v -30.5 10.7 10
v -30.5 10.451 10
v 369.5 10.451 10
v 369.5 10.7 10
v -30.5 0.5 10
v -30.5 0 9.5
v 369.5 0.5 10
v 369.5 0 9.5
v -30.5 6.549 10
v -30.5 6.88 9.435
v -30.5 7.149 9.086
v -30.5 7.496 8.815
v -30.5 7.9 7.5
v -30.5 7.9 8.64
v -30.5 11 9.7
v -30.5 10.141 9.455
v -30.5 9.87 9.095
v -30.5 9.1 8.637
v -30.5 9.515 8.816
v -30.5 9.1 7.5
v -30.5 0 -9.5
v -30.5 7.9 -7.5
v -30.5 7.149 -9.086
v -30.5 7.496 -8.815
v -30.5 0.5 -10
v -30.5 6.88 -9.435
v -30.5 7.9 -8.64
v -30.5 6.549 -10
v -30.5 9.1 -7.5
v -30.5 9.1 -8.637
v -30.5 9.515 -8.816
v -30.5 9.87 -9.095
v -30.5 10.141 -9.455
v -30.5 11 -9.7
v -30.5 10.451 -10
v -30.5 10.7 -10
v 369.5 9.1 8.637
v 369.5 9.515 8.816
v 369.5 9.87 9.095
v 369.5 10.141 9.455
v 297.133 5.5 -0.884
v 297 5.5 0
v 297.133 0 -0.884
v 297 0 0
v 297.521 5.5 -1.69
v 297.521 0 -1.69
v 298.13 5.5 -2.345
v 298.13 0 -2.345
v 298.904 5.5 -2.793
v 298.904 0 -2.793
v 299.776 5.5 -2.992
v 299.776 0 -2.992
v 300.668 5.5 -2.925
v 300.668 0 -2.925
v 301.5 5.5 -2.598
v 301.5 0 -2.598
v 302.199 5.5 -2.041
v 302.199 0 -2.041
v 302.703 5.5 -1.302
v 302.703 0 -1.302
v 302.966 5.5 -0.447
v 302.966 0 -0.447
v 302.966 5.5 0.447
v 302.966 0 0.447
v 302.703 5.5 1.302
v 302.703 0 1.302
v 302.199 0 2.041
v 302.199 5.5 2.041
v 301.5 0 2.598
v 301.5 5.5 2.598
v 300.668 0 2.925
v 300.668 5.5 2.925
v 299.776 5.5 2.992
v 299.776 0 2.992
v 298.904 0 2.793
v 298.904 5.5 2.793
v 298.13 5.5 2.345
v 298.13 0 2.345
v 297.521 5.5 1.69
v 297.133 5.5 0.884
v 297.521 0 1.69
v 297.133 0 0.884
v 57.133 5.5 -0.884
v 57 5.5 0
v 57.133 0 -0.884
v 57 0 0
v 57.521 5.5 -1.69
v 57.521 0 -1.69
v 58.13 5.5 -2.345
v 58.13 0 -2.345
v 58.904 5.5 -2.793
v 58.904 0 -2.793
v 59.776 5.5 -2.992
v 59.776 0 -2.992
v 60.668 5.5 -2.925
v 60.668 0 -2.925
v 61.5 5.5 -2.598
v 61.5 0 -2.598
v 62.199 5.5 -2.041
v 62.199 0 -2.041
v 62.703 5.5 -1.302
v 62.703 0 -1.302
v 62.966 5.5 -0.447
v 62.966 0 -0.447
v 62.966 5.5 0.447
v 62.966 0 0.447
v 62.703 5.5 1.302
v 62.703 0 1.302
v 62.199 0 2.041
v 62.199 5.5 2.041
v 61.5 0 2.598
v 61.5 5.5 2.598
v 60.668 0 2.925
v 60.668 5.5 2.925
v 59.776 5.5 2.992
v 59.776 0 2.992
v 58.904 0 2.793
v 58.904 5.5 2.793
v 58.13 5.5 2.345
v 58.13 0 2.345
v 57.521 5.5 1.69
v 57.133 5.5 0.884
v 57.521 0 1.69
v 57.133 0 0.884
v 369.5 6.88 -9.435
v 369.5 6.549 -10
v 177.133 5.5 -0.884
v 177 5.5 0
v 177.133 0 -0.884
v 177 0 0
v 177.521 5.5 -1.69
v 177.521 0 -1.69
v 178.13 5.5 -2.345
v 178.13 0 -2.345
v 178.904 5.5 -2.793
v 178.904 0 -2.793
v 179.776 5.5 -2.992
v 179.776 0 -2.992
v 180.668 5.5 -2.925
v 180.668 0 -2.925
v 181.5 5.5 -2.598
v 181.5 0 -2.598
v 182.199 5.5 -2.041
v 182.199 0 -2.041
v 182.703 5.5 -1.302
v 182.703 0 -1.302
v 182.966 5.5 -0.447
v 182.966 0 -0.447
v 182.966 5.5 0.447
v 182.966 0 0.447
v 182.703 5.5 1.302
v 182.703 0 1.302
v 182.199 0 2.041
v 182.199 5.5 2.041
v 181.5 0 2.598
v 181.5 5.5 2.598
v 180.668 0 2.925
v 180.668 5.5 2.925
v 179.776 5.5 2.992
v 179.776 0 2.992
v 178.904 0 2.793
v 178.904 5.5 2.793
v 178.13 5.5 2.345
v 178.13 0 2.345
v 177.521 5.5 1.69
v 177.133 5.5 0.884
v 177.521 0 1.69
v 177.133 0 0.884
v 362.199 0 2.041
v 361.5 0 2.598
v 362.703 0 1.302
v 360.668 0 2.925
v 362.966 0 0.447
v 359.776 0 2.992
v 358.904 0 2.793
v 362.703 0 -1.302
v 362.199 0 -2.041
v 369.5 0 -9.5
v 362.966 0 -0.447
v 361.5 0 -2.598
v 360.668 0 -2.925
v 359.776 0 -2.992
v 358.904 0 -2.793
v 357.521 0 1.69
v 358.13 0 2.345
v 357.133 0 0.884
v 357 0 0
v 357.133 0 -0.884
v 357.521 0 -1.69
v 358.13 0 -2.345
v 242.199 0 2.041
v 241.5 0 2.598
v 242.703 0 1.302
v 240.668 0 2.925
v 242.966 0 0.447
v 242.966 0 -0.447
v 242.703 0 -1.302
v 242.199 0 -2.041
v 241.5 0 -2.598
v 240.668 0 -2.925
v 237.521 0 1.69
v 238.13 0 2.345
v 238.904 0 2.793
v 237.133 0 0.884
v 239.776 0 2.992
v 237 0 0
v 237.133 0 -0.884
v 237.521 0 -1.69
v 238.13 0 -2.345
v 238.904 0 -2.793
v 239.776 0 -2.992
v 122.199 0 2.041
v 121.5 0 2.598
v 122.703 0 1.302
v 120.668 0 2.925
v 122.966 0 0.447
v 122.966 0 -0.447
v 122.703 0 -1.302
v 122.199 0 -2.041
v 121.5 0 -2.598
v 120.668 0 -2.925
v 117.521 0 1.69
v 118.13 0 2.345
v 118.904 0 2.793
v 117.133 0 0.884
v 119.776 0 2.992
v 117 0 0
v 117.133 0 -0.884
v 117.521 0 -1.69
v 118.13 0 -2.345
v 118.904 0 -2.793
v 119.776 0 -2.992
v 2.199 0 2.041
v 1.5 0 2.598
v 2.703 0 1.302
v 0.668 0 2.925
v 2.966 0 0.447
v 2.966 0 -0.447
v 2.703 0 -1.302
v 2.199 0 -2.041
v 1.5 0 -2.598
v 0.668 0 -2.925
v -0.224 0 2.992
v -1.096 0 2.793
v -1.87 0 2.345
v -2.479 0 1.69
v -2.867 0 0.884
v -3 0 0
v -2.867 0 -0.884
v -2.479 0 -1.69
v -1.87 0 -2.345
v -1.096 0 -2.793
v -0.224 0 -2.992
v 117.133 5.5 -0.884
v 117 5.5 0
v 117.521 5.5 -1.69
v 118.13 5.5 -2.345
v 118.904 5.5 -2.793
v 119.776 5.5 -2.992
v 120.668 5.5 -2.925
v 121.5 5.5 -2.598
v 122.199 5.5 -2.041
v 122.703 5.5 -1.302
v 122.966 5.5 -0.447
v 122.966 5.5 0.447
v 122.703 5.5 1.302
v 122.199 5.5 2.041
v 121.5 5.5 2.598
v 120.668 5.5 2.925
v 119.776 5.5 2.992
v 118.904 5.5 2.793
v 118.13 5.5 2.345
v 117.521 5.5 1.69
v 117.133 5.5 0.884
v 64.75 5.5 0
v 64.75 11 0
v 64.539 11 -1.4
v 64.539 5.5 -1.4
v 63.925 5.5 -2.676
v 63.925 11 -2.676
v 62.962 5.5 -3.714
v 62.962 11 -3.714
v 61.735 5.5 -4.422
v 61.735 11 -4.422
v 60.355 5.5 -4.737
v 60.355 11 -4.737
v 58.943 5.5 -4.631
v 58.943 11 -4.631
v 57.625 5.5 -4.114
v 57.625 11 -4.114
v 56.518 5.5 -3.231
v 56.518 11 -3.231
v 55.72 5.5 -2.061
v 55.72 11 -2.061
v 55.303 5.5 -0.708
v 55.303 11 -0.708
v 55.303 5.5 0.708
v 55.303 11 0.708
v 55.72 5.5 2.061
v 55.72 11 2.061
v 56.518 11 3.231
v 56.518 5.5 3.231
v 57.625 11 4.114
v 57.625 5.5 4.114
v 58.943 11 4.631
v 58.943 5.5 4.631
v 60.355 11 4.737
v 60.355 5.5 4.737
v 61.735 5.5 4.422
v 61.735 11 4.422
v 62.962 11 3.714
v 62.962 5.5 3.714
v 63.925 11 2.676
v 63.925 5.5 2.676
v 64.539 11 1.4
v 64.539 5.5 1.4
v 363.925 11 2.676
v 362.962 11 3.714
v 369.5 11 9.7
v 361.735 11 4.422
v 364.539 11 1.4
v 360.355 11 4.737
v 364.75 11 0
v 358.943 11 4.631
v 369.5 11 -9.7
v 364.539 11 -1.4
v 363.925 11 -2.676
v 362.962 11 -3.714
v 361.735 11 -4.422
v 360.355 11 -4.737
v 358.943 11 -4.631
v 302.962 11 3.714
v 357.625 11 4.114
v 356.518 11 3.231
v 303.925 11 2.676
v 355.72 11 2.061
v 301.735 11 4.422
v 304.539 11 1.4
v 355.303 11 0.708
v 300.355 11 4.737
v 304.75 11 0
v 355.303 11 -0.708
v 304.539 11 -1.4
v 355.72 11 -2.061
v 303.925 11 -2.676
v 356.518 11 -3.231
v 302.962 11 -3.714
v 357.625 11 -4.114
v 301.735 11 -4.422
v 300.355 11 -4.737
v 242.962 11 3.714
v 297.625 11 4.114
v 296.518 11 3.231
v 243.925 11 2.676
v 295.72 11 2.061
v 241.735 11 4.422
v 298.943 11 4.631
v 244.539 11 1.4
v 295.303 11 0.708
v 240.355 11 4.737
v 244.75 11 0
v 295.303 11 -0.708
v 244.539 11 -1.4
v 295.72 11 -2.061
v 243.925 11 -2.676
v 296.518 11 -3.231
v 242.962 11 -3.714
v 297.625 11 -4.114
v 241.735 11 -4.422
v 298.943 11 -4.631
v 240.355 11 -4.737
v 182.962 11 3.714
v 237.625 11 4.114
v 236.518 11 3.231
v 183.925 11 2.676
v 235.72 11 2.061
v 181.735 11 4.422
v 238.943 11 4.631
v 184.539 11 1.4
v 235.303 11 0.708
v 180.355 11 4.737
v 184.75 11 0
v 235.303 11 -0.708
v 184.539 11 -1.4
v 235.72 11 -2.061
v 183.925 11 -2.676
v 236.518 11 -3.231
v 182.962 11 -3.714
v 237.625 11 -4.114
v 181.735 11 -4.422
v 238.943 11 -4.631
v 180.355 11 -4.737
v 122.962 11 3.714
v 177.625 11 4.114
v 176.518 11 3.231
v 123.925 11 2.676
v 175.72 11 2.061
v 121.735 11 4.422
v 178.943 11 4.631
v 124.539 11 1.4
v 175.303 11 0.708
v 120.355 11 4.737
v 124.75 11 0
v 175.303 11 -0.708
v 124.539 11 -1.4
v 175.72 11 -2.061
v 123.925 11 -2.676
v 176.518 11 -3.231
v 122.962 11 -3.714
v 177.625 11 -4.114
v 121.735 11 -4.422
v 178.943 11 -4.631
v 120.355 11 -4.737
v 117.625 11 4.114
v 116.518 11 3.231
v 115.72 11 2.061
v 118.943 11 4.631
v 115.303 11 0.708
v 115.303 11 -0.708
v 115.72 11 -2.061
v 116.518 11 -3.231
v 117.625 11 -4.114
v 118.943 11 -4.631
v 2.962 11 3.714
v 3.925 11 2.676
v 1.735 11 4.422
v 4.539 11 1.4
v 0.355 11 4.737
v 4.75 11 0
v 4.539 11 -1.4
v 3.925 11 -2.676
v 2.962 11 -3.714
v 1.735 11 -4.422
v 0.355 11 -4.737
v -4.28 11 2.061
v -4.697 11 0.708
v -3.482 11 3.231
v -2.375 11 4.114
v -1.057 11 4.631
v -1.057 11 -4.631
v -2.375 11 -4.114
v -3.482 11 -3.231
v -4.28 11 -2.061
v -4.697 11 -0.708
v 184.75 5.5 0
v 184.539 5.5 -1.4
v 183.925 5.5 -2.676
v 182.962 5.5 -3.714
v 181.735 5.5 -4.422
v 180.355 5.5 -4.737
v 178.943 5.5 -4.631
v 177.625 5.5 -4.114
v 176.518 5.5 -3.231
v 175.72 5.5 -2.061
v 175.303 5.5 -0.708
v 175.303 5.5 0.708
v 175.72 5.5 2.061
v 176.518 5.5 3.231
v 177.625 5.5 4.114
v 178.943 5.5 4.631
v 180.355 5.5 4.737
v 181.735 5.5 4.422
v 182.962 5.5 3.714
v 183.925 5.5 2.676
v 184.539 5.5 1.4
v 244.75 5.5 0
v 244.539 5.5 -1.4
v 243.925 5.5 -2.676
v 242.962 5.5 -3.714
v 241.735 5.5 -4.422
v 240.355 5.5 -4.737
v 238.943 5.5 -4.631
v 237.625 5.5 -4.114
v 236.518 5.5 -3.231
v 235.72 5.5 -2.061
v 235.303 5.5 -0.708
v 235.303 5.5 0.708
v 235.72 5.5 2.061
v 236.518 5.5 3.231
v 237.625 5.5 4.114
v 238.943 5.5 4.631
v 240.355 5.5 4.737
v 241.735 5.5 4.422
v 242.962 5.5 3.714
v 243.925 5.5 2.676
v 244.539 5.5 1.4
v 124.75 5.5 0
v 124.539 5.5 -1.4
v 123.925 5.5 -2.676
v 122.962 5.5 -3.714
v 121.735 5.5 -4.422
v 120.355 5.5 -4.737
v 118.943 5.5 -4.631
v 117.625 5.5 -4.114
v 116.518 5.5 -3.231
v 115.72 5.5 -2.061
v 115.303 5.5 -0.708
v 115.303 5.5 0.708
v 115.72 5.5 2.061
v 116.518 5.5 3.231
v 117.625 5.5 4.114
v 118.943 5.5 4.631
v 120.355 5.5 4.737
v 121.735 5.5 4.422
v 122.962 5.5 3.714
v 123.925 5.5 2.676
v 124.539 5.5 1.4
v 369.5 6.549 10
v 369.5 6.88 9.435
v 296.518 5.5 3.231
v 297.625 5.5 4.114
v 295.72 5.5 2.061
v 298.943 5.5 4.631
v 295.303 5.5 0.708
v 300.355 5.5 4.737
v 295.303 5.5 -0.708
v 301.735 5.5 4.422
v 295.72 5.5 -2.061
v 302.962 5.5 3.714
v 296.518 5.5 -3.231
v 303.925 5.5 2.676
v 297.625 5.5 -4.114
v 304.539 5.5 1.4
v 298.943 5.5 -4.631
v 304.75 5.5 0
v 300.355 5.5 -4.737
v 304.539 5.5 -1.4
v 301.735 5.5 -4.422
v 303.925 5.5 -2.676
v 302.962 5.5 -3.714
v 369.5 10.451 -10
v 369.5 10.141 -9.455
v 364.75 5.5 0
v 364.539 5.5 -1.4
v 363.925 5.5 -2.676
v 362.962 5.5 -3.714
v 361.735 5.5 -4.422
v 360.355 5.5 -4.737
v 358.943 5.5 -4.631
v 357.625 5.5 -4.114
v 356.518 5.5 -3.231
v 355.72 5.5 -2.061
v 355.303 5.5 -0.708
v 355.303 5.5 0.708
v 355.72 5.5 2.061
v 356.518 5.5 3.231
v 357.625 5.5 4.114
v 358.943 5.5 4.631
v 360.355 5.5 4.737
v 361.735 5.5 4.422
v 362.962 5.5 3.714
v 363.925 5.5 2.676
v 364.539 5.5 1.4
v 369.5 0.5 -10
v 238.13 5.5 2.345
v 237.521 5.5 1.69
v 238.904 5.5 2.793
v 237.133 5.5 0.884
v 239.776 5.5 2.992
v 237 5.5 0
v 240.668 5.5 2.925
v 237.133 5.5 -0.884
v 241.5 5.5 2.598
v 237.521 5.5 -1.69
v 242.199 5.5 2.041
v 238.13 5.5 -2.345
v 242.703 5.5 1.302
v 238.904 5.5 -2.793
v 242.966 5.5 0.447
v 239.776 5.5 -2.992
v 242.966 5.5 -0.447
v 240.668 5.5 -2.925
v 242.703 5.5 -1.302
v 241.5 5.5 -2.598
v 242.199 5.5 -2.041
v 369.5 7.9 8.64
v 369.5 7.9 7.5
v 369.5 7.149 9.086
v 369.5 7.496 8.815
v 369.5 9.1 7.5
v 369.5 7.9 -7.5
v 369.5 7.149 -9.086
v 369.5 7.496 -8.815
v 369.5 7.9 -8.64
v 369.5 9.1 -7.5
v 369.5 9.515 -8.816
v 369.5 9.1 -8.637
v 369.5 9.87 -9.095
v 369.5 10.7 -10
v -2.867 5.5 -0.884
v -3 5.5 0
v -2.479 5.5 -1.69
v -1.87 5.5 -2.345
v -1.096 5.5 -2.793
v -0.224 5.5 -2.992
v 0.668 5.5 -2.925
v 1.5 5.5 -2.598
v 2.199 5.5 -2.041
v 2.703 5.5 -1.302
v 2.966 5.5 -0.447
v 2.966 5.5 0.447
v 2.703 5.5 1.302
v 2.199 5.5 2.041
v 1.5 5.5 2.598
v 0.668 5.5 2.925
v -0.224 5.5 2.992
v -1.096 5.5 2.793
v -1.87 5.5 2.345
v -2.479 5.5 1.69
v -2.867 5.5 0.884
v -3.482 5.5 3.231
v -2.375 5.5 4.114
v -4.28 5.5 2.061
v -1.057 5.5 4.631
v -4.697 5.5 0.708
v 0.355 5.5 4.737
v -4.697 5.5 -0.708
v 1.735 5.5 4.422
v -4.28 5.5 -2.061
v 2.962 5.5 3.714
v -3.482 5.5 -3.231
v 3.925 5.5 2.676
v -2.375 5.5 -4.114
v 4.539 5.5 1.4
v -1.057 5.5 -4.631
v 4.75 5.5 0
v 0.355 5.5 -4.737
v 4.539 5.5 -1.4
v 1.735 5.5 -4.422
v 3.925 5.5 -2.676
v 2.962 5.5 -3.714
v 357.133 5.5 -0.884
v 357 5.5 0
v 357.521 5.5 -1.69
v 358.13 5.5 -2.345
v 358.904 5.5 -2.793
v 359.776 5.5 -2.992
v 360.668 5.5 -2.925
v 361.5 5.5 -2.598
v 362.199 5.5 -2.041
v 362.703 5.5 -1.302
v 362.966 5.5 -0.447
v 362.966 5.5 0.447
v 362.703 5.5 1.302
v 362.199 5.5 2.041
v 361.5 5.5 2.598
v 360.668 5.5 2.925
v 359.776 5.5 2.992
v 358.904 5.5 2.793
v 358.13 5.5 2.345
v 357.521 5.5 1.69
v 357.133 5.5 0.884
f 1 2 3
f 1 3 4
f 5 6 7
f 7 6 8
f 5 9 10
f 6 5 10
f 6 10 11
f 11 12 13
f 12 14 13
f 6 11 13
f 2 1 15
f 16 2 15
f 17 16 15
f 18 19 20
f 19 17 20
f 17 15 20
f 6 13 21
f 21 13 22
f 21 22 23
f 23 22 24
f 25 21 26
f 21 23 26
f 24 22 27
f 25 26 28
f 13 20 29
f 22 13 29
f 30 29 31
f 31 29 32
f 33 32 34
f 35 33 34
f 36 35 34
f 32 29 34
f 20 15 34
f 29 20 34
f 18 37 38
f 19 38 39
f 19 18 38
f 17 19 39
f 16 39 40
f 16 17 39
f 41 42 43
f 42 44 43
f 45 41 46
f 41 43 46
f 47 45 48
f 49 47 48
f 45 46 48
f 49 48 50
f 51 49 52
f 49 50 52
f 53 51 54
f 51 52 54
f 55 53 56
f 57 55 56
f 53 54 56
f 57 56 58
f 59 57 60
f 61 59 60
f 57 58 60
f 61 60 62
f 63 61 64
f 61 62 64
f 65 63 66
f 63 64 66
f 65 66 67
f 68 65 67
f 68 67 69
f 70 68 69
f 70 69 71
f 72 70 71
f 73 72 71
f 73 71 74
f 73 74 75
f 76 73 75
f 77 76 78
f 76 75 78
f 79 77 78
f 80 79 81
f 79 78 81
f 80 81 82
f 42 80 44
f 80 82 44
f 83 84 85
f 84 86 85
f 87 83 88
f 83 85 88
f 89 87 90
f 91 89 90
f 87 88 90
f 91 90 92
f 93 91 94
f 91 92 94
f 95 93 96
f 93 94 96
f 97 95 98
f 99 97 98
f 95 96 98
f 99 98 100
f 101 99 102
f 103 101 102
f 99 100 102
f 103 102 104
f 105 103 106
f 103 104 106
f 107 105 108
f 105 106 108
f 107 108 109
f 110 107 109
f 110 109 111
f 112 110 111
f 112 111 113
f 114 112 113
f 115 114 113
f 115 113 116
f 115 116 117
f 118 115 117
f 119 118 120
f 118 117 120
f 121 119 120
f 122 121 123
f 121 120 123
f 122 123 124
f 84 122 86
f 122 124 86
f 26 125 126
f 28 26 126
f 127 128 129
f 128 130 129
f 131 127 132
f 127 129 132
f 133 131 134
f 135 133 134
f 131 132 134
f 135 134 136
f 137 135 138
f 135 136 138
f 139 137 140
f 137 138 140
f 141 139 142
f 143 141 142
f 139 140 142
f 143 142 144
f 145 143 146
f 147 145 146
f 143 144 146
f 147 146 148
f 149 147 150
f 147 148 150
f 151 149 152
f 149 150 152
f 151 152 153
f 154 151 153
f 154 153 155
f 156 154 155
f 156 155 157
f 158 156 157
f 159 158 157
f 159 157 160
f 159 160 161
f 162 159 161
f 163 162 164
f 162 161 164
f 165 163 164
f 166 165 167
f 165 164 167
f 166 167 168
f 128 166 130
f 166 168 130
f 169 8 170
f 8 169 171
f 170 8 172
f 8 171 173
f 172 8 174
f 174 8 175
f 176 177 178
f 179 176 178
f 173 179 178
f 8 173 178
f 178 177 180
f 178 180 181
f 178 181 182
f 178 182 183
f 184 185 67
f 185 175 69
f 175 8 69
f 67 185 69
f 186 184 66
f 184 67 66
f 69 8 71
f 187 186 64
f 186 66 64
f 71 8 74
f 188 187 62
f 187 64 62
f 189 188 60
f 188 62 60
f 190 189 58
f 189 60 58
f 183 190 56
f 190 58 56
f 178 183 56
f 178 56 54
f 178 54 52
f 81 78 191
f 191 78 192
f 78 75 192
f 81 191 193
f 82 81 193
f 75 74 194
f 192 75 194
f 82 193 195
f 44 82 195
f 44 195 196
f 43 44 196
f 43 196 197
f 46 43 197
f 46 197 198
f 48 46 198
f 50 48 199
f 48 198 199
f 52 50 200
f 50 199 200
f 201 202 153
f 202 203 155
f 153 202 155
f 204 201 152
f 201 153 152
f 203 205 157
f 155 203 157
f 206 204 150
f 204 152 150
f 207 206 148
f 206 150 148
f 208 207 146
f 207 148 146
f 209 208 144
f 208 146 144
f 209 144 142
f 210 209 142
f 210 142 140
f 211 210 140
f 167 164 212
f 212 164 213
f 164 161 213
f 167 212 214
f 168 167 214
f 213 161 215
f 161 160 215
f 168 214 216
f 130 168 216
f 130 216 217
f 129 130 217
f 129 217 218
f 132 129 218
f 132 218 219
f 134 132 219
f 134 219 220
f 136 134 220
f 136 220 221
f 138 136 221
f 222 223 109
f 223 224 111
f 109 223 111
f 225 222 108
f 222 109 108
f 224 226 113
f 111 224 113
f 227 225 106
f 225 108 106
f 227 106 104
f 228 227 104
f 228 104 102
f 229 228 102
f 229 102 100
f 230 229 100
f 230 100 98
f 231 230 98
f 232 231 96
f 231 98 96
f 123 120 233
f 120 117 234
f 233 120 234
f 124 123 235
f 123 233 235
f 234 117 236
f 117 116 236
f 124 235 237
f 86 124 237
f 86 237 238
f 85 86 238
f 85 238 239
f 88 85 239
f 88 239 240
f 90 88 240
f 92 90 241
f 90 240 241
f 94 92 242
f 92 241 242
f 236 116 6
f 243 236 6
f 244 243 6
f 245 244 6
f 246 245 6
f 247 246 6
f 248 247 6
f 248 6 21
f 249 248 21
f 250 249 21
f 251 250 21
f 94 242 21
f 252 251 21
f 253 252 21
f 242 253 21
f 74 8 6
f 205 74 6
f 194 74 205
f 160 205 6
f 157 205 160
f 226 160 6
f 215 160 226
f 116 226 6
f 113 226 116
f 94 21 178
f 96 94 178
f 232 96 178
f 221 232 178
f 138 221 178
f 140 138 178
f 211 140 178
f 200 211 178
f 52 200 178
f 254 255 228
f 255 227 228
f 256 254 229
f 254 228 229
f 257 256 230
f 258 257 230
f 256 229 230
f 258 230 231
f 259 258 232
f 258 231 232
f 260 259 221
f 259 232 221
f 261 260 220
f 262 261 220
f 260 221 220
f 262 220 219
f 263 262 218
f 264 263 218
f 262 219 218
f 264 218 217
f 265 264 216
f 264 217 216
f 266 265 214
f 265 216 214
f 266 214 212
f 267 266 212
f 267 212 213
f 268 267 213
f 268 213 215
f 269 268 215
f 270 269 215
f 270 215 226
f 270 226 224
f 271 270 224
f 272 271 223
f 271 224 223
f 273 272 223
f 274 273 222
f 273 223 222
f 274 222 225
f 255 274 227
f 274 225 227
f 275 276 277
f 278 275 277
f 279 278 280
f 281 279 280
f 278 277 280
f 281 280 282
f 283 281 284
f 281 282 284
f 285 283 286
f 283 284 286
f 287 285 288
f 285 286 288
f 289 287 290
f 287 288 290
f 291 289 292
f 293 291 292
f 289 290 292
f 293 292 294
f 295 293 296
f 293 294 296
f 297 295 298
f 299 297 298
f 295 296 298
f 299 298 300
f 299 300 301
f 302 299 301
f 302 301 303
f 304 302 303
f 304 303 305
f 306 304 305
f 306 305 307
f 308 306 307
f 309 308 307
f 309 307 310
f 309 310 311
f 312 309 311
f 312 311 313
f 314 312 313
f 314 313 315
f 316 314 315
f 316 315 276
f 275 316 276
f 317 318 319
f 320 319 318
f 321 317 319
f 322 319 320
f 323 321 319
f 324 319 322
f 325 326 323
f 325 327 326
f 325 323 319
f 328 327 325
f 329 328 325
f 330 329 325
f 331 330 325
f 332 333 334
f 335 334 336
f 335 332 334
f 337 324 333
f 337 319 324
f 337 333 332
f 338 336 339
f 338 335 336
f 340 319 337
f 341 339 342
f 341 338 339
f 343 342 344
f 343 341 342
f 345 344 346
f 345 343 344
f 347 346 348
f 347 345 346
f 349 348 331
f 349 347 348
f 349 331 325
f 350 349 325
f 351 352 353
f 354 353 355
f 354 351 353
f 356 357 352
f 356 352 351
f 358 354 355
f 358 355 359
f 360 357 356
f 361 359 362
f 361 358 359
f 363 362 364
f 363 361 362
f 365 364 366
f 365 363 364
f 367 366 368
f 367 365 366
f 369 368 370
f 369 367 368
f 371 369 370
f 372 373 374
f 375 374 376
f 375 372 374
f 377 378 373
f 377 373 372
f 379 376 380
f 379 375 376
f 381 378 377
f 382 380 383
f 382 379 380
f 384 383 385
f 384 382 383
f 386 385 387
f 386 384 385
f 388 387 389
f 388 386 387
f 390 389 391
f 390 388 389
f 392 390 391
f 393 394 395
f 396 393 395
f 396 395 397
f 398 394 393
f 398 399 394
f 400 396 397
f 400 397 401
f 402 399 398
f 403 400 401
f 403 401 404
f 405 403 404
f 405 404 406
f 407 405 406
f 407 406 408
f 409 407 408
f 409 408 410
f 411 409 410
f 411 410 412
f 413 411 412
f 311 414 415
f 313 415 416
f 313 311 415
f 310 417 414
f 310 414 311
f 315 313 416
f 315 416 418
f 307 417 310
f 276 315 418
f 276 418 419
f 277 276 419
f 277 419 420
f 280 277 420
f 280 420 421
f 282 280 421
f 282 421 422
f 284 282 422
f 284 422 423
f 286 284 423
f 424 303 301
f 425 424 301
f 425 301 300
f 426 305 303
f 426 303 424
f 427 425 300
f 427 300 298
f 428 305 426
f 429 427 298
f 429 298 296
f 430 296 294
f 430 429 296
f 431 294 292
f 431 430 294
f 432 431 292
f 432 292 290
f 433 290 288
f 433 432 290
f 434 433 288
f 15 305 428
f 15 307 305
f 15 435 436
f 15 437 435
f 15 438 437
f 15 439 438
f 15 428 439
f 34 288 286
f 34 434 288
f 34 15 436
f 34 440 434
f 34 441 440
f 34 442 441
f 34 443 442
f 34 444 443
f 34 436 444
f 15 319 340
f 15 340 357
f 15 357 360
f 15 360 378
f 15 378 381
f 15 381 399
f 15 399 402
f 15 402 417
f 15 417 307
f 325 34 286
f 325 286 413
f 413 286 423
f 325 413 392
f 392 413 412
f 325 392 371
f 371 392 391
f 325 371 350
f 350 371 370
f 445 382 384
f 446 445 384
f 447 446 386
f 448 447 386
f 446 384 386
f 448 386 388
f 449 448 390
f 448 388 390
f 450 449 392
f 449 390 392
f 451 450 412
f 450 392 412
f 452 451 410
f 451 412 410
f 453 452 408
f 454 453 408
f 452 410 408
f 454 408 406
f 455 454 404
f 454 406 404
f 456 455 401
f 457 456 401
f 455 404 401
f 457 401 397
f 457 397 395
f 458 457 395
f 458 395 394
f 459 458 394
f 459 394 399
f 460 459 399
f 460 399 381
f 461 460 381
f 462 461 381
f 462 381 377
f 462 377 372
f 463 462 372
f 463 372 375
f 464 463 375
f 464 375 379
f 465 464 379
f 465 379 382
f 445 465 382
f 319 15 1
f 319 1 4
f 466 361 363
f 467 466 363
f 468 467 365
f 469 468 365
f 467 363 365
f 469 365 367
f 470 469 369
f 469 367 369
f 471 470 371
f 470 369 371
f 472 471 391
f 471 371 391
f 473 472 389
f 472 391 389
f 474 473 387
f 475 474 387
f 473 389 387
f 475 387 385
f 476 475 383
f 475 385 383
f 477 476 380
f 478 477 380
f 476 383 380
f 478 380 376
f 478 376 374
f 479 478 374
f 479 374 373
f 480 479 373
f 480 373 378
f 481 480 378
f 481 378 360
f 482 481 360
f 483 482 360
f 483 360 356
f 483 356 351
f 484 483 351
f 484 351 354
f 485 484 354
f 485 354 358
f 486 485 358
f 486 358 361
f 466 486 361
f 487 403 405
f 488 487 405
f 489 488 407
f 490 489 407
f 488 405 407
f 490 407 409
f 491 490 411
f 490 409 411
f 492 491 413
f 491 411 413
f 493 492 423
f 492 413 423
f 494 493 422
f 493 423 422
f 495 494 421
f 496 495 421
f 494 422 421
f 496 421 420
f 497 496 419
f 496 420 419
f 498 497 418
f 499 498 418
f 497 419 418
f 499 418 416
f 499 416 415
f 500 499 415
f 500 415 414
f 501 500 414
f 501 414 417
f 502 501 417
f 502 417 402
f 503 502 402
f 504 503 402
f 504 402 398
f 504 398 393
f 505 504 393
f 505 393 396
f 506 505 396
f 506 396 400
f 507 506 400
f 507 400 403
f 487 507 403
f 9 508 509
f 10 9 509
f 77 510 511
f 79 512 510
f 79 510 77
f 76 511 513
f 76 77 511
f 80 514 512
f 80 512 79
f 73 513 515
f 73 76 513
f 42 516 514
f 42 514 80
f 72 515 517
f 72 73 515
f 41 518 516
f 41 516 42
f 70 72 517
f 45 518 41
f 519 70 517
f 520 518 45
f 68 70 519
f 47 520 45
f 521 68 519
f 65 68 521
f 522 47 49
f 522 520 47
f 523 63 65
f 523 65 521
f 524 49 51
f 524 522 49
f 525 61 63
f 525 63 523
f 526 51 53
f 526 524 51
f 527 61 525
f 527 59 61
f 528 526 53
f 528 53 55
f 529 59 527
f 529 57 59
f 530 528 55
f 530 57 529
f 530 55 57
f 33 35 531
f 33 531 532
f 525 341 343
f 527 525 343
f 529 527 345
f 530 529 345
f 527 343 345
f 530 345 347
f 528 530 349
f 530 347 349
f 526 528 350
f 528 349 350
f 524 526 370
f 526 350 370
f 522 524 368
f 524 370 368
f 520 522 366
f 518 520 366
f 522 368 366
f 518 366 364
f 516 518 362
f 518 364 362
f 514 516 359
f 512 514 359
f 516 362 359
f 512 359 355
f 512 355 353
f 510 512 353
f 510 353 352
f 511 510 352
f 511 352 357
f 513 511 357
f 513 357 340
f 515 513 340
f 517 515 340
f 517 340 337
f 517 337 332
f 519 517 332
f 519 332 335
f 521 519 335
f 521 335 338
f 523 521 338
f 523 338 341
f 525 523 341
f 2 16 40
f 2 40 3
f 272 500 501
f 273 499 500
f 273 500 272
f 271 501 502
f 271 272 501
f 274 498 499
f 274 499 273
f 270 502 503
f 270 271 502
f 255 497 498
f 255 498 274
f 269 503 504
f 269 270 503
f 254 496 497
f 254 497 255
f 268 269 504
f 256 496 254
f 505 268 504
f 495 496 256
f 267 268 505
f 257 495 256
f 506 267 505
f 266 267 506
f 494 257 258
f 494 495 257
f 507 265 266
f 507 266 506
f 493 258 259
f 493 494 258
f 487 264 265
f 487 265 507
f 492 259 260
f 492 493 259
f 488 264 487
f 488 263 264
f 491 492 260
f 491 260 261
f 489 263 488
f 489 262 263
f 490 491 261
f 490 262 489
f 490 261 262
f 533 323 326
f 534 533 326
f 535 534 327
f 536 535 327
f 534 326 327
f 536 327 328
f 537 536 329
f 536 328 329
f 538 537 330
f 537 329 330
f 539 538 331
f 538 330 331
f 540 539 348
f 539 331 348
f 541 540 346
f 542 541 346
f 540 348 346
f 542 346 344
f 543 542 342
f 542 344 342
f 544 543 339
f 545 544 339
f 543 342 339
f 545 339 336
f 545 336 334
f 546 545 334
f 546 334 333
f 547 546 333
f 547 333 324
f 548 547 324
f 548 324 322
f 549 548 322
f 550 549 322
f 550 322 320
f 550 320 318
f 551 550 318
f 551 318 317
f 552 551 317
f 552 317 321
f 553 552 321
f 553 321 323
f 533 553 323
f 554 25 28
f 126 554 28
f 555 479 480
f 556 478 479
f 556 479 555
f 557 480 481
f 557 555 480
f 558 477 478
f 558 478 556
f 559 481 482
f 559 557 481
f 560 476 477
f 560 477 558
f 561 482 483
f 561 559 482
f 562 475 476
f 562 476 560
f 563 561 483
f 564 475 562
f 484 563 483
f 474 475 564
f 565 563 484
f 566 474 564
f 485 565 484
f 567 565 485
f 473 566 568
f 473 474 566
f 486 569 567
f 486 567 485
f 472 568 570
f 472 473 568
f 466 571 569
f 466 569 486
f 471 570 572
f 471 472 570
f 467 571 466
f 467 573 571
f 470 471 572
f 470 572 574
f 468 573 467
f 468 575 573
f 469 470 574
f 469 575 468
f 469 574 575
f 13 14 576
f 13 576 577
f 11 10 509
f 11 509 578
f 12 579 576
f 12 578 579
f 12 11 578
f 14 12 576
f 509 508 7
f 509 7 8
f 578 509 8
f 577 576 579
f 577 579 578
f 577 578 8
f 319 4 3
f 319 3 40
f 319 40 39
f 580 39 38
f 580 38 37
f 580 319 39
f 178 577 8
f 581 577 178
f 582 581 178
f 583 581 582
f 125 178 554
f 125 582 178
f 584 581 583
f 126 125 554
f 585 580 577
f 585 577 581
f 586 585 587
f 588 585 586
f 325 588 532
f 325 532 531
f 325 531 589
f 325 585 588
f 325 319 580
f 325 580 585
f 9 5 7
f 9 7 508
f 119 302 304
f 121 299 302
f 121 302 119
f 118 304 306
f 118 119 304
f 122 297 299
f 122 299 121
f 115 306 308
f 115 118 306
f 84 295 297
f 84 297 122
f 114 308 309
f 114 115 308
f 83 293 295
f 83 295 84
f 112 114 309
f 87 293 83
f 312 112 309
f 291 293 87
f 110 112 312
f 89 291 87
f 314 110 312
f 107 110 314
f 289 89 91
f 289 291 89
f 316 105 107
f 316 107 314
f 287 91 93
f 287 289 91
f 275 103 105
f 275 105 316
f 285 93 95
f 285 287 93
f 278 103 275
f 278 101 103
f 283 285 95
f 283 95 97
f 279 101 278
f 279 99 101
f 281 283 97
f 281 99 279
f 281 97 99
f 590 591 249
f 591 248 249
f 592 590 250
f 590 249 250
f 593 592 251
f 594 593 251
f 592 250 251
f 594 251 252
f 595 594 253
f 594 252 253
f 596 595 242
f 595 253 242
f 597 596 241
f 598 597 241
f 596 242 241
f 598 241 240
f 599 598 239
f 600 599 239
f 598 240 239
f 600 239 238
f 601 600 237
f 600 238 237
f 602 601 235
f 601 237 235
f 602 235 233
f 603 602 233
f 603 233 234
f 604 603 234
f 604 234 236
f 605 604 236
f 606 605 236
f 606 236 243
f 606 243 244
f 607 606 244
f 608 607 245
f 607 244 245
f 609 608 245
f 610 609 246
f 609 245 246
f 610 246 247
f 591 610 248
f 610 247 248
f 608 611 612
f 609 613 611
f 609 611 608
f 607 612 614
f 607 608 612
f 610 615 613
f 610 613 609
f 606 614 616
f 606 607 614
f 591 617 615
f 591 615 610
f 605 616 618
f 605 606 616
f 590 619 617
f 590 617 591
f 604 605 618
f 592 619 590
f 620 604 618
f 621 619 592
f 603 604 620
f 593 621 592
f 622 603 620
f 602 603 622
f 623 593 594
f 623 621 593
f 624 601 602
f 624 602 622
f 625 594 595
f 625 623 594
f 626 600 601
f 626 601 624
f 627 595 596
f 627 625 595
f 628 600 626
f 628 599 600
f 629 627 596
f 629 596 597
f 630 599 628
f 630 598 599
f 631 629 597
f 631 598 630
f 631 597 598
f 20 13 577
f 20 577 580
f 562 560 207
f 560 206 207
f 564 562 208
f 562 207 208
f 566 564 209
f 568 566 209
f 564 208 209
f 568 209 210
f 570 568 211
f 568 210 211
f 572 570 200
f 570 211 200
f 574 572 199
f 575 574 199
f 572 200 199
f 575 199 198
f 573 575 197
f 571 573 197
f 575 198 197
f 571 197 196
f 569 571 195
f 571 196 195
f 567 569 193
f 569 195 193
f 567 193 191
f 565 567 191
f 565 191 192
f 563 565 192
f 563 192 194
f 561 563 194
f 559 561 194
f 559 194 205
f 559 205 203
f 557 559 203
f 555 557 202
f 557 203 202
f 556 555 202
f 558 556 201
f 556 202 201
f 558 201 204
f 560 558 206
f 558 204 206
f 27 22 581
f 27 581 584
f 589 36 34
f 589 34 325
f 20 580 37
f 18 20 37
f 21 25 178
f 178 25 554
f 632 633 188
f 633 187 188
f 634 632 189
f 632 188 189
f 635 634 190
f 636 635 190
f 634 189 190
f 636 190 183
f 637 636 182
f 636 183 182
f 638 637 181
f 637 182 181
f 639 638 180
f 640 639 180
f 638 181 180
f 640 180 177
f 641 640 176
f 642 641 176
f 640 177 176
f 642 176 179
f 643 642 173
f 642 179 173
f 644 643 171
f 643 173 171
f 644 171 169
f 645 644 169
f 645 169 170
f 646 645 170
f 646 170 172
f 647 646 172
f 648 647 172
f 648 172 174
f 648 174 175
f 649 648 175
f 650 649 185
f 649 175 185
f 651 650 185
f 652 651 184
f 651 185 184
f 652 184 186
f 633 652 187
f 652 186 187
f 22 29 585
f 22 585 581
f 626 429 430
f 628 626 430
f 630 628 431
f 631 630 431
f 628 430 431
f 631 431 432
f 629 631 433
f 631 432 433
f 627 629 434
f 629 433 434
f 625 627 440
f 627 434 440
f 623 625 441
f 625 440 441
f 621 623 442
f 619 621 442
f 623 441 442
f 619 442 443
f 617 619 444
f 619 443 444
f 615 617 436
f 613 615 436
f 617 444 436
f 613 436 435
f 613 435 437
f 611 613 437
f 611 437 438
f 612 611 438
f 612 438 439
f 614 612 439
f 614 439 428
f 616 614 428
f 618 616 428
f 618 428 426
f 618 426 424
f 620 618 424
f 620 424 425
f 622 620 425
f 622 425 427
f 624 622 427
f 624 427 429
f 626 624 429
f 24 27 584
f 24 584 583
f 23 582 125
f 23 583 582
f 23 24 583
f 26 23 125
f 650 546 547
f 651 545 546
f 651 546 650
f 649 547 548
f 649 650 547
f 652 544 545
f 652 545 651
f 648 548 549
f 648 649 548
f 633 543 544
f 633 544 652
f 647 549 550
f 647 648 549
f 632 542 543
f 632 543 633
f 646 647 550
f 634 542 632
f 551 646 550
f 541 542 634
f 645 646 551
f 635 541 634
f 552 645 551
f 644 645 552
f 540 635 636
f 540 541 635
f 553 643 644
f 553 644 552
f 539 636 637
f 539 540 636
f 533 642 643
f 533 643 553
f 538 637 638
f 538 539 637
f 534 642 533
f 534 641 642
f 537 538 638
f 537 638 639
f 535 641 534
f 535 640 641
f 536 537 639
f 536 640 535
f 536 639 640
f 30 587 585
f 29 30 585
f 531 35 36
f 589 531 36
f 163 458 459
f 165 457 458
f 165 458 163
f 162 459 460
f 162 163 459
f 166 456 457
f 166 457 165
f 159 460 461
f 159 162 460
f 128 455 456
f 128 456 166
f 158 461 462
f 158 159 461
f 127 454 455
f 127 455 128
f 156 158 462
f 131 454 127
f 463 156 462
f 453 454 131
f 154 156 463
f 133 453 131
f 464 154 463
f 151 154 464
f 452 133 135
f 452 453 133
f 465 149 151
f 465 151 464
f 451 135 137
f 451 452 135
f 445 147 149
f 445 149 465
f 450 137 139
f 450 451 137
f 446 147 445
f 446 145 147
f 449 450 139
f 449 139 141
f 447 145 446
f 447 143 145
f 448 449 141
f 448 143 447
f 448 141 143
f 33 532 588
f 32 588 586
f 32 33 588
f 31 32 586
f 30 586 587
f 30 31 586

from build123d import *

# Parameters (mm, degrees)
SKETCH1_W                                    = 20
SKETCH1_H                                    = 11
BOSS_EXTRUDE1_DEPTH                          = 400
CUT_EXTRUDE2_DEPTH                           = 401.276154673
CBORE_FOR_SOCKET_HEAD_CAP_SCREW1_D           = 6
CBORE_FOR_SOCKET_HEAD_CAP_SCREW1_CBORE_D     = 9.5
CBORE_FOR_SOCKET_HEAD_CAP_SCREW1_CBORE_DEPTH = 5.5
LPATTERN1_COUNT                              = 7
LPATTERN1_PITCH                              = 60
CHAMFER1_SIZE                                = 0.3
CHAMFER2_SIZE                                = 0.5


with BuildPart() as part:
    # Sketch1 → Boss-Extrude1 (new body)
    with BuildSketch(Plane(origin=(-30.5, 0, 0), x_dir=(0, 0, -1), z_dir=(1, 0, 0))):
        with Locations((0, 5.5)):
            Rectangle(SKETCH1_W, SKETCH1_H)
    extrude(amount=BOSS_EXTRUDE1_DEPTH)

    # Sketch3 → Cut-Extrude2 (cut, through all)
    with BuildSketch(Plane(origin=(-30.5, 0, 0), x_dir=(0, 0, -1), z_dir=(1, 0, 0))):
        with BuildLine():
            Line((10, 10.451039482), (9.455259378, 10.141421591))
            ThreePointArc((9.455259378, 10.141421591), (8.943868436, 9.701092928), (8.637115571, 9.1))
            Line((8.637115571, 9.1), (7.5, 9.1))
            Line((7.5, 9.1), (7.5, 7.9))
            Line((7.5, 7.9), (8.64, 7.9))
            ThreePointArc((8.64, 7.9), (8.939788863, 7.314120259), (9.434780564, 6.880401858))
            Line((9.434780564, 6.880401858), (10, 6.548960518))
            Line((10, 6.548960518), (10, 10.451039482))
        make_face()
        with BuildLine():
            Line((-10, 10.451039482), (-10, 6.548960518))
            Line((-10, 6.548960518), (-9.434780564, 6.880401858))
            ThreePointArc((-9.434780564, 6.880401858), (-8.939788863, 7.314120259), (-8.64, 7.9))
            Line((-8.64, 7.9), (-7.5, 7.9))
            Line((-7.5, 7.9), (-7.5, 9.1))
            Line((-7.5, 9.1), (-8.637115571, 9.1))
            ThreePointArc((-8.637115571, 9.1), (-8.943868436, 9.701092928), (-9.455259378, 10.141421591))
            Line((-9.455259378, 10.141421591), (-10, 10.451039482))
        make_face()
    extrude(amount=CUT_EXTRUDE2_DEPTH, mode=Mode.SUBTRACT)

    # CBORE for Socket Head Cap Screw1 (through all)
    with Locations(Plane(origin=(0, 11, 0), x_dir=(1, 0, 0), z_dir=(0, 1, 0))):
        with Locations((0, 0)):
            cbore_for_socket_head_cap_screw1 = CounterBoreHole(CBORE_FOR_SOCKET_HEAD_CAP_SCREW1_D / 2, CBORE_FOR_SOCKET_HEAD_CAP_SCREW1_CBORE_D / 2, CBORE_FOR_SOCKET_HEAD_CAP_SCREW1_CBORE_DEPTH)

    # LPattern1: CBORE for Socket Head Cap Screw1 ×7
    with Locations(*[(i * LPATTERN1_PITCH, 0, 0) for i in range(1, LPATTERN1_COUNT)]):
        add(cbore_for_socket_head_cap_screw1, mode=Mode.SUBTRACT)

    # Chamfer1
    chamfer1_edges = [part.edges().sort_by_distance(p)[0] for p in [
        (169.5, 11, 10),
        (169.5, 11, -10),
    ]]
    chamfer(chamfer1_edges, length=CHAMFER1_SIZE)

    # Chamfer2
    chamfer2_edges = [part.edges().sort_by_distance(p)[0] for p in [
        (169.5, 0, -10),
        (169.5, 0, 10),
    ]]
    chamfer(chamfer2_edges, length=CHAMFER2_SIZE)


solid = part.part
